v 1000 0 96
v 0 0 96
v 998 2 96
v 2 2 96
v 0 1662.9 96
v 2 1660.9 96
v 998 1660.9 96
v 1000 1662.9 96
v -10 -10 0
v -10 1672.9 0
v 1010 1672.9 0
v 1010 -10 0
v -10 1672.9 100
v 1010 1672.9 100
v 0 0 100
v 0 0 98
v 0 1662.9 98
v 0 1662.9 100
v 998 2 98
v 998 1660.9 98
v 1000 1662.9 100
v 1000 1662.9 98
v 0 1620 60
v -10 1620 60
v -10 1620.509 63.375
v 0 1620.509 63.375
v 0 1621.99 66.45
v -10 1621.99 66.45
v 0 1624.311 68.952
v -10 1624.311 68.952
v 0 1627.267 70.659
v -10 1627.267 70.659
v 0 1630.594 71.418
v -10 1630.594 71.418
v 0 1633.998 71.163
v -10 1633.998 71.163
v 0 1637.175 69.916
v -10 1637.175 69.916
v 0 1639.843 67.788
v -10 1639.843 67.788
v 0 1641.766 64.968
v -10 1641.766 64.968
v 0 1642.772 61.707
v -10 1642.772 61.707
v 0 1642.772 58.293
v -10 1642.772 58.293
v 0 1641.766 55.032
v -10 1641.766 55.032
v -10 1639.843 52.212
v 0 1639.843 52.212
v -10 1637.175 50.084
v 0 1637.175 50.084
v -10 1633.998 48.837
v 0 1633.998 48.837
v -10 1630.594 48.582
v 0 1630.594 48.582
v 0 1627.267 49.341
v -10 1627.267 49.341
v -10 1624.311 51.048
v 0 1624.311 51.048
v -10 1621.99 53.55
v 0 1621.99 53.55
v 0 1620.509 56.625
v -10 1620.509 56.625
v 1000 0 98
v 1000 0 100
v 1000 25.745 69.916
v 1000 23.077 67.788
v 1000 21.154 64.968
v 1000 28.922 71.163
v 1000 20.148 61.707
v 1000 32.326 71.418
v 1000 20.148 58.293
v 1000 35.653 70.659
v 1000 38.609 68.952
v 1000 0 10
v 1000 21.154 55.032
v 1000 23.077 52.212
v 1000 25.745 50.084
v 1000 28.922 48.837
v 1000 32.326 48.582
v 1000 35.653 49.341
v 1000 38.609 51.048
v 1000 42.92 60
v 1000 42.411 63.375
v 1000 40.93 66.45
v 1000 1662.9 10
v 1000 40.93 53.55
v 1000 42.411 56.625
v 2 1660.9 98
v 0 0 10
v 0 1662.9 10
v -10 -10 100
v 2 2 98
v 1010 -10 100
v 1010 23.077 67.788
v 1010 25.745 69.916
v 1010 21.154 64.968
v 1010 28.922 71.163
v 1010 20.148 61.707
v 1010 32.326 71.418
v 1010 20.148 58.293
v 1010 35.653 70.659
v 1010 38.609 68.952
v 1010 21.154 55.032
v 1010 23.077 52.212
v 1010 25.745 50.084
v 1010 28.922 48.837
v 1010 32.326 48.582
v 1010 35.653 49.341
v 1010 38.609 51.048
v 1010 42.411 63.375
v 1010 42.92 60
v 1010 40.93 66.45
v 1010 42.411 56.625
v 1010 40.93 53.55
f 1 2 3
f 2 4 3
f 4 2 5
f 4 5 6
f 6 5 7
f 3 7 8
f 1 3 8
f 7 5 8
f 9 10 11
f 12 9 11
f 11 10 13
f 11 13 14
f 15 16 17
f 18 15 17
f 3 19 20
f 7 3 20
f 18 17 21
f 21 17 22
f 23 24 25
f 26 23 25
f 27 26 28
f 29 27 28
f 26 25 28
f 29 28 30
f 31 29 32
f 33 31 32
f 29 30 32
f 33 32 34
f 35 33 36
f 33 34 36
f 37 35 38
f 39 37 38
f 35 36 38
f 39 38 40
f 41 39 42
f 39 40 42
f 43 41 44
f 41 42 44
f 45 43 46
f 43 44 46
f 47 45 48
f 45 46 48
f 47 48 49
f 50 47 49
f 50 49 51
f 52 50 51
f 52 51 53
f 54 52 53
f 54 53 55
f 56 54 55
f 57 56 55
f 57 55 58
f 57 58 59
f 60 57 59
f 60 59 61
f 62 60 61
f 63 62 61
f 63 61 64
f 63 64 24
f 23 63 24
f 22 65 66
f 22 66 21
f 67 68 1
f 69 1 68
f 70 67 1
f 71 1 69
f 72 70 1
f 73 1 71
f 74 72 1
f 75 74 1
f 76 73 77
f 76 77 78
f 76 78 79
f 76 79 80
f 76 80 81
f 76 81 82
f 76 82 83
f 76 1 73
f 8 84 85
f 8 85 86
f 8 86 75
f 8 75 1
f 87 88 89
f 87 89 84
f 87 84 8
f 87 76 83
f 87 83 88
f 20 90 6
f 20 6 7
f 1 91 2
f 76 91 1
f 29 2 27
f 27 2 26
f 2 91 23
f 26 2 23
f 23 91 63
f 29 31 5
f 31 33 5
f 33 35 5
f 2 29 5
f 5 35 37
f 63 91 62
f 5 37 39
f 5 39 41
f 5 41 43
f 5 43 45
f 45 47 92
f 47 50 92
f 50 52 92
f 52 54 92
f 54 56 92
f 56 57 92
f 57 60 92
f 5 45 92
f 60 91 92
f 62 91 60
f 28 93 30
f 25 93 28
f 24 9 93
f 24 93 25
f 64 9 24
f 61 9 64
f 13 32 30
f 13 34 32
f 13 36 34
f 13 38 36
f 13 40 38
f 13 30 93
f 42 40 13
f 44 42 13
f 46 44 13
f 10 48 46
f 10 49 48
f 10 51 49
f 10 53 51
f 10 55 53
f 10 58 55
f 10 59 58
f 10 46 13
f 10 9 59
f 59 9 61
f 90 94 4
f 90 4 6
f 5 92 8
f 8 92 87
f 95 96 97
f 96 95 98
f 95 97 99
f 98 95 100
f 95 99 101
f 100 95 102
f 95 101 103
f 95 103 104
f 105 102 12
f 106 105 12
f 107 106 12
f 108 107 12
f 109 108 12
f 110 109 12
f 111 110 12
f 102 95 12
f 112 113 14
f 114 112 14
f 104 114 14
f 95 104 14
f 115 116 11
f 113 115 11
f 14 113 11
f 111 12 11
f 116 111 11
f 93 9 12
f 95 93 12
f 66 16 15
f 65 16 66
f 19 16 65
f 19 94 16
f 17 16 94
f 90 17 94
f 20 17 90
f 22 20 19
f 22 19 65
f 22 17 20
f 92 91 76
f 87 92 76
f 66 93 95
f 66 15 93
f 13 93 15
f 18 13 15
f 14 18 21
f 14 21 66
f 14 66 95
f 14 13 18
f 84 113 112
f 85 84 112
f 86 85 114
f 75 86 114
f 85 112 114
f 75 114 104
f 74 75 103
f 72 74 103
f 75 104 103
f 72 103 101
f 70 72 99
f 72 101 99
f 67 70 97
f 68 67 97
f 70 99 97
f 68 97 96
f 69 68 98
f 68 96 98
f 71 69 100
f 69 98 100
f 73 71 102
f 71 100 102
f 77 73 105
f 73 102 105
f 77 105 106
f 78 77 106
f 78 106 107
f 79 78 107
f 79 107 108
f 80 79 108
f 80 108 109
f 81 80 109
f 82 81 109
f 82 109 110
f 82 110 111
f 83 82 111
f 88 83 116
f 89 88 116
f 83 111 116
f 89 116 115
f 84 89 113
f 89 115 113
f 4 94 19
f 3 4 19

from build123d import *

# Parameters (mm, degrees)
SKETCH1_W           = 1000
SKETCH1_H           = 1662.9
BOSS_EXTRUDE1_DEPTH = 10
SKETCH2_W           = 1020
SKETCH2_H           = 1682.9
SKETCH2_W_2         = 1000
SKETCH2_H_2         = 1662.9
BOSS_EXTRUDE2_DEPTH = 100
CUT_EXTRUDE1_REACH  = 1963.885
SKETCH3_R           = 11.45
SKETCH4_R           = 11.45
CUT_EXTRUDE2_DEPTH  = 10
SKETCH6_W           = 1000
SKETCH6_H           = 1662.9
SKETCH6_W_2         = 996
SKETCH6_H_2         = 1658.9
BOSS_EXTRUDE4_DEPTH = 2


with BuildPart() as part:
    # Sketch1 → Boss-Extrude1 (new body)
    with BuildSketch(Plane.XY):
        with Locations((500, 831.45)):
            Rectangle(SKETCH1_W, SKETCH1_H)
    extrude(amount=BOSS_EXTRUDE1_DEPTH)

    # Sketch2 → Boss-Extrude2 (add)
    with BuildSketch(Plane.XY):
        with Locations((500, 831.45)):
            Rectangle(SKETCH2_W, SKETCH2_H)
        with Locations((500, 831.45)):
            Rectangle(SKETCH2_W_2, SKETCH2_H_2, mode=Mode.SUBTRACT)
    extrude(amount=BOSS_EXTRUDE2_DEPTH)

    # Sketch3 → Cut-Extrude1 (cut, up to next)
    with BuildSketch(Plane.ZY.offset(10), mode=Mode.PRIVATE) as cut_extrude1_sk1:
        with Locations(Location((60, 1631.45, 0), (0, 0, 270))):
            Circle(SKETCH3_R)
    cut_extrude1_tool1 = extrude(cut_extrude1_sk1.sketch, amount=-CUT_EXTRUDE1_REACH, mode=Mode.PRIVATE) & part.part
    add(cut_extrude1_tool1.solids().sort_by_distance((-10, 1631.45, 60))[0], mode=Mode.SUBTRACT)

    # Sketch4 → Cut-Extrude2 (cut)
    with BuildSketch(Plane(origin=(1010, 0, 0), x_dir=(0, 0, -1), z_dir=(1, 0, 0))):
        with Locations(Location((-60, 31.47, 0), (0, 0, 90))):
            Circle(SKETCH4_R)
    extrude(amount=-CUT_EXTRUDE2_DEPTH, mode=Mode.SUBTRACT)

    # Sketch6 → Boss-Extrude4 (add)
    with BuildSketch(Plane.XY.offset(98)):
        with Locations((500, 831.45)):
            Rectangle(SKETCH6_W, SKETCH6_H)
        with Locations((500, 831.45)):
            Rectangle(SKETCH6_W_2, SKETCH6_H_2, mode=Mode.SUBTRACT)
    extrude(amount=-BOSS_EXTRUDE4_DEPTH)


solid = part.part
